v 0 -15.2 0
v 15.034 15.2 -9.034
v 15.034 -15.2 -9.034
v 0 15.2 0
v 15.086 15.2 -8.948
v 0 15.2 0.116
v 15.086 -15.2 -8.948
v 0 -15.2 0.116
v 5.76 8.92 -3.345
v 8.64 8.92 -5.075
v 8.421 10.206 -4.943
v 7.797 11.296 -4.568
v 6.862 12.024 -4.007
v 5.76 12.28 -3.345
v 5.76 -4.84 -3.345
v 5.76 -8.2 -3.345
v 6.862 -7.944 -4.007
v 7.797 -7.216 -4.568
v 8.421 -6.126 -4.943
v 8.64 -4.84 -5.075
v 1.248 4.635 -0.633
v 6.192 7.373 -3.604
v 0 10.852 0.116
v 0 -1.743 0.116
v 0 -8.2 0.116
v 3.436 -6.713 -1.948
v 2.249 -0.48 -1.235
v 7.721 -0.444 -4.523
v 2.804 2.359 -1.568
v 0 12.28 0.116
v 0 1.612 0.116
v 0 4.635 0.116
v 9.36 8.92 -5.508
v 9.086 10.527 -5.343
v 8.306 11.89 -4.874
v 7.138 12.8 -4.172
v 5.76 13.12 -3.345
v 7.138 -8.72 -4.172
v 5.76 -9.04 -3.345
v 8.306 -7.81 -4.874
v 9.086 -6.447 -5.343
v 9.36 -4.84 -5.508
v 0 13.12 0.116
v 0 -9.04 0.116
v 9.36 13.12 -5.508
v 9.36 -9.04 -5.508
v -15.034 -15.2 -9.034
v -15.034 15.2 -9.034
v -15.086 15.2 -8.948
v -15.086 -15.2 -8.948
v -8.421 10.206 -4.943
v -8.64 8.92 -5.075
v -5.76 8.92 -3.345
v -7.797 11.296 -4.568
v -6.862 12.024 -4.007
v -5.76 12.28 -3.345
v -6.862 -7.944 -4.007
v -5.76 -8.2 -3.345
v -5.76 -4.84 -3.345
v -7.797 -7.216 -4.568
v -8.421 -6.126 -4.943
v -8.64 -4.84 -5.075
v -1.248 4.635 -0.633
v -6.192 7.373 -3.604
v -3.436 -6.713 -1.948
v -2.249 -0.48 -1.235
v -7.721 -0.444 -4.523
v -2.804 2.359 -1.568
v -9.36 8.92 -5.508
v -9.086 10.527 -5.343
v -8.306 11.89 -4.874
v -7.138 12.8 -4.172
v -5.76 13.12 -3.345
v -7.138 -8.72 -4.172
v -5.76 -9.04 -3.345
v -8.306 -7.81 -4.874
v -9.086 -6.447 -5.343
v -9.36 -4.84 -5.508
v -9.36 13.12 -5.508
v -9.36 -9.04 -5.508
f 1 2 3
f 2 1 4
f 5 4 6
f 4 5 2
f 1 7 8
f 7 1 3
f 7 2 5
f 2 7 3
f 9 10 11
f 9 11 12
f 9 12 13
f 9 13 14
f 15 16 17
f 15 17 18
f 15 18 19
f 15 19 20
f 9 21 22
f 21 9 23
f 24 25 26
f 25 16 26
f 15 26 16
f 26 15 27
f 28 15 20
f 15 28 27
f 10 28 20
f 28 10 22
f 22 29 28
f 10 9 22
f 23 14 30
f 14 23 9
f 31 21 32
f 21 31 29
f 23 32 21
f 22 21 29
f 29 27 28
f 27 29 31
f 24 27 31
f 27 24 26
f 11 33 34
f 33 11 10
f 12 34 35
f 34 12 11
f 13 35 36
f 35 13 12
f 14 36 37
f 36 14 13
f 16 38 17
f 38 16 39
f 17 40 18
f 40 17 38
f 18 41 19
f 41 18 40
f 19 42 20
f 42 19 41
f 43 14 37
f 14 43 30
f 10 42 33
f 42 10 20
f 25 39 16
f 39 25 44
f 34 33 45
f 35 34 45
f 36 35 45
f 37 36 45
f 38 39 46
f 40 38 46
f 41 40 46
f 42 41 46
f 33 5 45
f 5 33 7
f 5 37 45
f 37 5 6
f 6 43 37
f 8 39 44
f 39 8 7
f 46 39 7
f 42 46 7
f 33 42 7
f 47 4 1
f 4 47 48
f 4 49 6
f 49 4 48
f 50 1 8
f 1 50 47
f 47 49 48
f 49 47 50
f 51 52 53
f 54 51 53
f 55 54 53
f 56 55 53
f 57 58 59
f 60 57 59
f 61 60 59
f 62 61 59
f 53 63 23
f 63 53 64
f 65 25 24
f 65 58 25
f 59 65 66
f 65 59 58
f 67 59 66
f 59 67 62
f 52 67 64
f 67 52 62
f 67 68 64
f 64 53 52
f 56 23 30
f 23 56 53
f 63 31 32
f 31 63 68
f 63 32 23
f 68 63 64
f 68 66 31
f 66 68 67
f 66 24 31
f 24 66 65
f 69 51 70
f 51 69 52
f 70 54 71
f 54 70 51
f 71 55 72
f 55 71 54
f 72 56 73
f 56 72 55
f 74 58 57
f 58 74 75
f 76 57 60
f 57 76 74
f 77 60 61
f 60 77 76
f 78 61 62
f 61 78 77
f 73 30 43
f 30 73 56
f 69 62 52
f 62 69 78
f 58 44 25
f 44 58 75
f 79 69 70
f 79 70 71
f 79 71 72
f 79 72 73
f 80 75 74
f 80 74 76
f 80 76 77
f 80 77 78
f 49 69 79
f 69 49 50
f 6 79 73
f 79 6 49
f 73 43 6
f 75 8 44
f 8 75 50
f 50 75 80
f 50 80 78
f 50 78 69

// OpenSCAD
// file: ../p/1-4ring4.scad
use <../lib.scad>
function ldraw_lib__1_4ring4() = [
// 0 Ring  4 x 0.25
// 0 Name: 1-4ring4.dat
// 0 Author: Bernd Broich [bbroich]
// 0 !LDRAW_ORG Primitive UPDATE 2012-01
// 0 !LICENSE Licensed under CC BY 2.0 and CC BY 4.0 : see CAreadme.txt
// 
// 0 BFC CERTIFY CCW
  [0,"BFC","CERTIFY"],
  [0,"BFC","CCW"],
// 
// 0 !HISTORY 2000-09-30 [PTadmin] Official Update 2000-02
// 0 !HISTORY 2003-08-01 [PTadmin] Official Update 2003-02
// 0 !HISTORY 2007-06-22 [PTadmin] Header formatted for Contributor Agreement
// 0 !HISTORY 2008-07-01 [PTadmin] Official Update 2008-01
// 0 !HISTORY 2012-02-16 [Philo] Changed to CCW
// 0 !HISTORY 2012-03-30 [PTadmin] Official Update 2012-01
// 
// 
// 4 16 5 0 0 4.6195 0 1.9135 3.6956 0 1.5308 4 0 0
  [4,16,5,0,0,4.6195,0,1.9135,3.6956,0,1.5308,4,0,0],
// 4 16 4.6195 0 1.9135 3.5355 0 3.5355 2.8284 0 2.8284 3.6956 0 1.5308
  [4,16,4.6195,0,1.9135,3.5355,0,3.5355,2.8284,0,2.8284,3.6956,0,1.5308],
// 4 16 3.5355 0 3.5355 1.9135 0 4.6195 1.5308 0 3.6956 2.8284 0 2.8284
  [4,16,3.5355,0,3.5355,1.9135,0,4.6195,1.5308,0,3.6956,2.8284,0,2.8284],
// 4 16 1.9135 0 4.6195 0 0 5 0 0 4 1.5308 0 3.6956
  [4,16,1.9135,0,4.6195,0,0,5,0,0,4,1.5308,0,3.6956],
];
module ldraw_lib__1_4ring4(step=0, col=false, unit=2/5, alt=false, line=0.2, solid=!$preview)
    makepoly(ldraw_lib__1_4ring4(), step=step, col=col, unit=unit, alt=alt, line=line, solid=solid);
ldraw_lib__1_4ring4(line=0.2);
// file: ../p/1-4ndis.scad
use <../lib.scad>
function ldraw_lib__1_4ndis() = [
// 0 Disc Negative 0.25
// 0 Name: 1-4ndis.dat
// 0 Author: James Jessiman
// 0 !LDRAW_ORG Primitive UPDATE 2012-01
// 0 !LICENSE Licensed under CC BY 4.0 : see CAreadme.txt
// 
// 0 BFC CERTIFY CCW
  [0,"BFC","CERTIFY"],
  [0,"BFC","CCW"],
// 
// 0 !HISTORY 2002-03-23 [sbliss] Added BFC Statement
// 0 !HISTORY 2002-04-25 [PTadmin] Official Update 2002-02
// 0 !HISTORY 2007-06-22 [PTadmin] Header formatted for Contributor Agreement
// 0 !HISTORY 2008-07-01 [PTadmin] Official Update 2008-01
// 0 !HISTORY 2012-02-16 [Philo] Changed to CCW
// 0 !HISTORY 2012-03-30 [PTadmin] Official Update 2012-01
// 
// 
// 3 16 0.9239 0 0.3827 1 0 0 1 0 1
  [3,16,0.9239,0,0.3827,1,0,0,1,0,1],
// 3 16 0.7071 0 0.7071 0.9239 0 0.3827 1 0 1
  [3,16,0.7071,0,0.7071,0.9239,0,0.3827,1,0,1],
// 3 16 0.3827 0 0.9239 0.7071 0 0.7071 1 0 1
  [3,16,0.3827,0,0.9239,0.7071,0,0.7071,1,0,1],
// 3 16 0 0 1 0.3827 0 0.9239 1 0 1
  [3,16,0,0,1,0.3827,0,0.9239,1,0,1],
];
module ldraw_lib__1_4ndis(step=0, col=false, unit=2/5, alt=false, line=0.2, solid=!$preview)
    makepoly(ldraw_lib__1_4ndis(), step=step, col=col, unit=unit, alt=alt, line=line, solid=solid);
ldraw_lib__1_4ndis(line=0.2);
// file: ../p/1-4disc.scad
use <../lib.scad>
function ldraw_lib__1_4disc() = [
// 0 Disc 0.25
// 0 Name: 1-4disc.dat
// 0 Author: James Jessiman
// 0 !LDRAW_ORG Primitive UPDATE 2002-02
// 0 !LICENSE Licensed under CC BY 4.0 : see CAreadme.txt
// 
// 0 BFC CERTIFY CCW
  [0,"BFC","CERTIFY"],
  [0,"BFC","CCW"],
// 
// 0 !HISTORY 2002-03-23 [sbliss] Added BFC statement.
// 0 !HISTORY 2002-04-25 [PTadmin] Official Update 2002-02
// 0 !HISTORY 2007-06-22 [PTadmin] Header formatted for Contributor Agreement
// 0 !HISTORY 2008-07-01 [PTadmin] Official Update 2008-01
// 
// 
// 3 16 0 0 0 1 0 0 0.9239 0 0.3827
  [3,16,0,0,0,1,0,0,0.9239,0,0.3827],
// 3 16 0 0 0 0.9239 0 0.3827 0.7071 0 0.7071
  [3,16,0,0,0,0.9239,0,0.3827,0.7071,0,0.7071],
// 3 16 0 0 0 0.7071 0 0.7071 0.3827 0 0.9239
  [3,16,0,0,0,0.7071,0,0.7071,0.3827,0,0.9239],
// 3 16 0 0 0 0.3827 0 0.9239 0 0 1
  [3,16,0,0,0,0.3827,0,0.9239,0,0,1],
// 0
];
module ldraw_lib__1_4disc(step=0, col=false, unit=2/5, alt=false, line=0.2, solid=!$preview)
    makepoly(ldraw_lib__1_4disc(), step=step, col=col, unit=unit, alt=alt, line=line, solid=solid);
ldraw_lib__1_4disc(line=0.2);
// file: s/4616559ps5.scad
use <../../lib.scad>
use <../../p/1-4disc.scad>
use <../../p/1-4ndis.scad>
use <../../p/1-4ring4.scad>
function ldraw_lib__s__4616559ps5() = [
// 0 ~Sticker Maersk Logo with Thin Border
// 0 Name: s\4616559ps5.dat
// 0 Author: J.C. Tchang [tchang]
// 0 !LDRAW_ORG Subpart UPDATE 2012-03
// 0 !LICENSE Licensed under CC BY 4.0 : see CAreadme.txt
// 
// 0 BFC CERTIFY CCW
  [0,"BFC","CERTIFY"],
  [0,"BFC","CCW"],
// 
// 0 !HISTORY 2012-12-28 [PTadmin] Official Update 2012-03
// 
// 
// 1 313 16.8 0 22.3 8.4 0 0 0 1 0 0 0 8.4 1-4disc.dat
  [1,313,16.8,0,22.3,8.4,0,0,0,1,0,0,0,8.4, ldraw_lib__1_4disc()],
// 1 313 16.8 0 -12.1 0 0 8.4 0 1 0 -8.4 0 0 1-4disc.dat
  [1,313,16.8,0,-12.1,0,0,8.4,0,1,0,-8.4,0,0, ldraw_lib__1_4disc()],
// 4 313 0 0 27.13 3.639 0 11.588 18.06 0 18.432 16.8 0 22.3
  [4,313,0,0,27.13,3.639,0,11.588,18.06,0,18.432,16.8,0,22.3],
// 3 313 0 0 -4.357 0 0 -20.5 10.021 0 -16.783
  [3,313,0,0,-4.357,0,0,-20.5,10.021,0,-16.783],
// 3 313 0 0 -20.5 16.8 0 -20.5 10.021 0 -16.783
  [3,313,0,0,-20.5,16.8,0,-20.5,10.021,0,-16.783],
// 4 313 10.021 0 -16.783 16.8 0 -20.5 16.8 0 -12.1 6.558 0 -1.199
  [4,313,10.021,0,-16.783,16.8,0,-20.5,16.8,0,-12.1,6.558,0,-1.199],
// 4 313 22.52 0 -1.111 6.558 0 -1.199 16.8 0 -12.1 25.2 0 -12.1
  [4,313,22.52,0,-1.111,6.558,0,-1.199,16.8,0,-12.1,25.2,0,-12.1],
// 4 313 22.52 0 -1.111 25.2 0 -12.1 25.2 0 22.3 18.06 0 18.432
  [4,313,22.52,0,-1.111,25.2,0,-12.1,25.2,0,22.3,18.06,0,18.432],
// 3 313 18.06 0 18.432 8.177 0 5.897 22.52 0 -1.111
  [3,313,18.06,0,18.432,8.177,0,5.897,22.52,0,-1.111],
// 3 313 25.2 0 22.3 16.8 0 22.3 18.06 0 18.432
  [3,313,25.2,0,22.3,16.8,0,22.3,18.06,0,18.432],
// 4 313 16.8 0 22.3 16.8 0 30.7 0 0 30.7 0 0 27.13
  [4,313,16.8,0,22.3,16.8,0,30.7,0,0,30.7,0,0,27.13],
// 0 //
// 4 15 3.639 0 11.588 0 0 11.588 0 0 4.03 8.177 0 5.897
  [4,15,3.639,0,11.588,0,0,11.588,0,0,4.03,8.177,0,5.897],
// 3 15 0 0 27.13 0 0 11.588 3.639 0 11.588
  [3,15,0,0,27.13,0,0,11.588,3.639,0,11.588],
// 3 15 18.06 0 18.432 3.639 0 11.588 8.177 0 5.897
  [3,15,18.06,0,18.432,3.639,0,11.588,8.177,0,5.897],
// 4 15 8.177 0 5.897 0 0 4.03 6.558 0 -1.199 22.52 0 -1.111
  [4,15,8.177,0,5.897,0,0,4.03,6.558,0,-1.199,22.52,0,-1.111],
// 4 15 6.558 0 -1.199 0 0 4.03 0 0 -4.357 10.021 0 -16.783
  [4,15,6.558,0,-1.199,0,0,4.03,0,0,-4.357,10.021,0,-16.783],
// 1 15 16.8 0 22.3 2.1 0 0 0 1 0 0 0 2.1 1-4ring4.dat
  [1,15,16.8,0,22.3,2.1,0,0,0,1,0,0,0,2.1, ldraw_lib__1_4ring4()],
// 1 15 16.8 0 -12.1 0 0 2.1 0 1 0 -2.1 0 0 1-4ring4.dat
  [1,15,16.8,0,-12.1,0,0,2.1,0,1,0,-2.1,0,0, ldraw_lib__1_4ring4()],
// 4 15 16.8 0 32.8 0 0 32.8 0 0 30.7 16.8 0 30.7
  [4,15,16.8,0,32.8,0,0,32.8,0,0,30.7,16.8,0,30.7],
// 4 15 27.3 0 -12.1 27.3 0 22.3 25.2 0 22.3 25.2 0 -12.1
  [4,15,27.3,0,-12.1,27.3,0,22.3,25.2,0,22.3,25.2,0,-12.1],
// 4 15 0 0 -20.5 0 0 -22.6 16.8 0 -22.6 16.8 0 -20.5
  [4,15,0,0,-20.5,0,0,-22.6,16.8,0,-22.6,16.8,0,-20.5],
// 0 //
// 1 16 16.8 0 22.3 10.5 0 0 0 1 0 0 0 10.5 1-4ndis.dat
  [1,16,16.8,0,22.3,10.5,0,0,0,1,0,0,0,10.5, ldraw_lib__1_4ndis()],
// 1 16 16.8 0 -12.1 0 0 10.5 0 1 0 -10.5 0 0 1-4ndis.dat
  [1,16,16.8,0,-12.1,0,0,10.5,0,1,0,-10.5,0,0, ldraw_lib__1_4ndis()],
// 4 16 44 0 38 27.3 0 32.8 27.3 0 22.3 44 0 -38
  [4,16,44,0,38,27.3,0,32.8,27.3,0,22.3,44,0,-38],
// 4 16 16.8 0 32.8 27.3 0 32.8 44 0 38 0 0 38
  [4,16,16.8,0,32.8,27.3,0,32.8,44,0,38,0,0,38],
// 3 16 0 0 38 0 0 32.8 16.8 0 32.8
  [3,16,0,0,38,0,0,32.8,16.8,0,32.8],
// 4 16 0 0 -22.6 0 0 -38 44 0 -38 16.8 0 -22.6
  [4,16,0,0,-22.6,0,0,-38,44,0,-38,16.8,0,-22.6],
// 3 16 27.3 0 -22.6 16.8 0 -22.6 44 0 -38
  [3,16,27.3,0,-22.6,16.8,0,-22.6,44,0,-38],
// 3 16 27.3 0 -12.1 27.3 0 -22.6 44 0 -38
  [3,16,27.3,0,-12.1,27.3,0,-22.6,44,0,-38],
// 3 16 27.3 0 22.3 27.3 0 -12.1 44 0 -38
  [3,16,27.3,0,22.3,27.3,0,-12.1,44,0,-38],
];
module ldraw_lib__s__4616559ps5(step=0, col=false, unit=2/5, alt=false, line=0.2, solid=!$preview)
    makepoly(ldraw_lib__s__4616559ps5(), step=step, col=col, unit=unit, alt=alt, line=line, solid=solid);
ldraw_lib__s__4616559ps5(line=0.2);
// main file
use <../lib.scad>
use <s/4616559ps5.scad>
function ldraw_lib__4616559ec01() = [
// 0 Sticker  3.8 x  4.4 with Maersk Logo (Formed)
// 0 Name: 4616559ec01.dat
// 0 Author: J.C. Tchang [tchang]
// 0 !LDRAW_ORG Part UPDATE 2012-03
// 0 !LICENSE Licensed under CC BY 4.0 : see CAreadme.txt
// 
// 0 BFC CERTIFY CCW
  [0,"BFC","CERTIFY"],
  [0,"BFC","CCW"],
// 
// 0 !KEYWORDS Set 10219
// 
// 0 !HISTORY 2012-12-28 [PTadmin] Official Update 2012-03
// 
// 
// 4 16 37.586 22.585 38 37.586 22.585 -38 0 0 -38 0 0 38
  [4,16,37.586,22.585,38,37.586,22.585,-38,0,0,-38,0,0,38],
// 4 16 0 -0.291 38 37.715 22.371 38 37.586 22.585 38 0 0 38
  [4,16,0,-0.291,38,37.715,22.371,38,37.586,22.585,38,0,0,38],
// 4 16 37.715 22.371 -38 0 -0.291 -38 0 0 -38 37.586 22.585 -38
  [4,16,37.715,22.371,-38,0,-0.291,-38,0,0,-38,37.586,22.585,-38],
// 4 16 37.715 22.371 38 37.715 22.371 -38 37.586 22.585 -38 37.586 22.585 38
  [4,16,37.715,22.371,38,37.715,22.371,-38,37.586,22.585,-38,37.586,22.585,38],
// 1 16 0 -0.291 0 0.857167 -0.515038 0 0.515038 0.857167 0 0 0 1 s\4616559ps5.dat
  [1,16,0,-0.291,0,0.857167,-0.515038,0,0.515038,0.857167,0,0,0,1, ldraw_lib__s__4616559ps5()],
// 0 //
// 4 16 0 0 38 0 0 -38 -37.586 22.585 -38 -37.586 22.585 38
  [4,16,0,0,38,0,0,-38,-37.586,22.585,-38,-37.586,22.585,38],
// 4 16 0 0 38 -37.586 22.585 38 -37.715 22.371 38 0 -0.291 38
  [4,16,0,0,38,-37.586,22.585,38,-37.715,22.371,38,0,-0.291,38],
// 4 16 -37.586 22.585 -38 0 0 -38 0 -0.291 -38 -37.715 22.371 -38
  [4,16,-37.586,22.585,-38,0,0,-38,0,-0.291,-38,-37.715,22.371,-38],
// 4 16 -37.586 22.585 38 -37.586 22.585 -38 -37.715 22.371 -38 -37.715 22.371 38
  [4,16,-37.586,22.585,38,-37.586,22.585,-38,-37.715,22.371,-38,-37.715,22.371,38],
// 1 16 0 -0.291 0 -0.857167 0.515038 0 0.515038 0.857167 0 0 0 1 s\4616559ps5.dat
  [1,16,0,-0.291,0,-0.857167,0.515038,0,0.515038,0.857167,0,0,0,1, ldraw_lib__s__4616559ps5()],
// 0 //
// 5 24 0 0 38 0 0 -38 37.586 22.585 38 -37.586 22.585 38
  [5,24,0,0,38,0,0,-38,37.586,22.585,38,-37.586,22.585,38],
// 5 24 0 -0.29166 38 0 -0.29166 -38 37.715 22.371 38 -37.715 22.371 38
  [5,24,0,-0.29166,38,0,-0.29166,-38,37.715,22.371,38,-37.715,22.371,38],
];
module ldraw_lib__4616559ec01(step=0, col=false, unit=2/5, alt=false, line=0.2, solid=!$preview)
    makepoly(ldraw_lib__4616559ec01(), step=step, col=col, unit=unit, alt=alt, line=line, solid=solid);
ldraw_lib__4616559ec01(line=0.2);
